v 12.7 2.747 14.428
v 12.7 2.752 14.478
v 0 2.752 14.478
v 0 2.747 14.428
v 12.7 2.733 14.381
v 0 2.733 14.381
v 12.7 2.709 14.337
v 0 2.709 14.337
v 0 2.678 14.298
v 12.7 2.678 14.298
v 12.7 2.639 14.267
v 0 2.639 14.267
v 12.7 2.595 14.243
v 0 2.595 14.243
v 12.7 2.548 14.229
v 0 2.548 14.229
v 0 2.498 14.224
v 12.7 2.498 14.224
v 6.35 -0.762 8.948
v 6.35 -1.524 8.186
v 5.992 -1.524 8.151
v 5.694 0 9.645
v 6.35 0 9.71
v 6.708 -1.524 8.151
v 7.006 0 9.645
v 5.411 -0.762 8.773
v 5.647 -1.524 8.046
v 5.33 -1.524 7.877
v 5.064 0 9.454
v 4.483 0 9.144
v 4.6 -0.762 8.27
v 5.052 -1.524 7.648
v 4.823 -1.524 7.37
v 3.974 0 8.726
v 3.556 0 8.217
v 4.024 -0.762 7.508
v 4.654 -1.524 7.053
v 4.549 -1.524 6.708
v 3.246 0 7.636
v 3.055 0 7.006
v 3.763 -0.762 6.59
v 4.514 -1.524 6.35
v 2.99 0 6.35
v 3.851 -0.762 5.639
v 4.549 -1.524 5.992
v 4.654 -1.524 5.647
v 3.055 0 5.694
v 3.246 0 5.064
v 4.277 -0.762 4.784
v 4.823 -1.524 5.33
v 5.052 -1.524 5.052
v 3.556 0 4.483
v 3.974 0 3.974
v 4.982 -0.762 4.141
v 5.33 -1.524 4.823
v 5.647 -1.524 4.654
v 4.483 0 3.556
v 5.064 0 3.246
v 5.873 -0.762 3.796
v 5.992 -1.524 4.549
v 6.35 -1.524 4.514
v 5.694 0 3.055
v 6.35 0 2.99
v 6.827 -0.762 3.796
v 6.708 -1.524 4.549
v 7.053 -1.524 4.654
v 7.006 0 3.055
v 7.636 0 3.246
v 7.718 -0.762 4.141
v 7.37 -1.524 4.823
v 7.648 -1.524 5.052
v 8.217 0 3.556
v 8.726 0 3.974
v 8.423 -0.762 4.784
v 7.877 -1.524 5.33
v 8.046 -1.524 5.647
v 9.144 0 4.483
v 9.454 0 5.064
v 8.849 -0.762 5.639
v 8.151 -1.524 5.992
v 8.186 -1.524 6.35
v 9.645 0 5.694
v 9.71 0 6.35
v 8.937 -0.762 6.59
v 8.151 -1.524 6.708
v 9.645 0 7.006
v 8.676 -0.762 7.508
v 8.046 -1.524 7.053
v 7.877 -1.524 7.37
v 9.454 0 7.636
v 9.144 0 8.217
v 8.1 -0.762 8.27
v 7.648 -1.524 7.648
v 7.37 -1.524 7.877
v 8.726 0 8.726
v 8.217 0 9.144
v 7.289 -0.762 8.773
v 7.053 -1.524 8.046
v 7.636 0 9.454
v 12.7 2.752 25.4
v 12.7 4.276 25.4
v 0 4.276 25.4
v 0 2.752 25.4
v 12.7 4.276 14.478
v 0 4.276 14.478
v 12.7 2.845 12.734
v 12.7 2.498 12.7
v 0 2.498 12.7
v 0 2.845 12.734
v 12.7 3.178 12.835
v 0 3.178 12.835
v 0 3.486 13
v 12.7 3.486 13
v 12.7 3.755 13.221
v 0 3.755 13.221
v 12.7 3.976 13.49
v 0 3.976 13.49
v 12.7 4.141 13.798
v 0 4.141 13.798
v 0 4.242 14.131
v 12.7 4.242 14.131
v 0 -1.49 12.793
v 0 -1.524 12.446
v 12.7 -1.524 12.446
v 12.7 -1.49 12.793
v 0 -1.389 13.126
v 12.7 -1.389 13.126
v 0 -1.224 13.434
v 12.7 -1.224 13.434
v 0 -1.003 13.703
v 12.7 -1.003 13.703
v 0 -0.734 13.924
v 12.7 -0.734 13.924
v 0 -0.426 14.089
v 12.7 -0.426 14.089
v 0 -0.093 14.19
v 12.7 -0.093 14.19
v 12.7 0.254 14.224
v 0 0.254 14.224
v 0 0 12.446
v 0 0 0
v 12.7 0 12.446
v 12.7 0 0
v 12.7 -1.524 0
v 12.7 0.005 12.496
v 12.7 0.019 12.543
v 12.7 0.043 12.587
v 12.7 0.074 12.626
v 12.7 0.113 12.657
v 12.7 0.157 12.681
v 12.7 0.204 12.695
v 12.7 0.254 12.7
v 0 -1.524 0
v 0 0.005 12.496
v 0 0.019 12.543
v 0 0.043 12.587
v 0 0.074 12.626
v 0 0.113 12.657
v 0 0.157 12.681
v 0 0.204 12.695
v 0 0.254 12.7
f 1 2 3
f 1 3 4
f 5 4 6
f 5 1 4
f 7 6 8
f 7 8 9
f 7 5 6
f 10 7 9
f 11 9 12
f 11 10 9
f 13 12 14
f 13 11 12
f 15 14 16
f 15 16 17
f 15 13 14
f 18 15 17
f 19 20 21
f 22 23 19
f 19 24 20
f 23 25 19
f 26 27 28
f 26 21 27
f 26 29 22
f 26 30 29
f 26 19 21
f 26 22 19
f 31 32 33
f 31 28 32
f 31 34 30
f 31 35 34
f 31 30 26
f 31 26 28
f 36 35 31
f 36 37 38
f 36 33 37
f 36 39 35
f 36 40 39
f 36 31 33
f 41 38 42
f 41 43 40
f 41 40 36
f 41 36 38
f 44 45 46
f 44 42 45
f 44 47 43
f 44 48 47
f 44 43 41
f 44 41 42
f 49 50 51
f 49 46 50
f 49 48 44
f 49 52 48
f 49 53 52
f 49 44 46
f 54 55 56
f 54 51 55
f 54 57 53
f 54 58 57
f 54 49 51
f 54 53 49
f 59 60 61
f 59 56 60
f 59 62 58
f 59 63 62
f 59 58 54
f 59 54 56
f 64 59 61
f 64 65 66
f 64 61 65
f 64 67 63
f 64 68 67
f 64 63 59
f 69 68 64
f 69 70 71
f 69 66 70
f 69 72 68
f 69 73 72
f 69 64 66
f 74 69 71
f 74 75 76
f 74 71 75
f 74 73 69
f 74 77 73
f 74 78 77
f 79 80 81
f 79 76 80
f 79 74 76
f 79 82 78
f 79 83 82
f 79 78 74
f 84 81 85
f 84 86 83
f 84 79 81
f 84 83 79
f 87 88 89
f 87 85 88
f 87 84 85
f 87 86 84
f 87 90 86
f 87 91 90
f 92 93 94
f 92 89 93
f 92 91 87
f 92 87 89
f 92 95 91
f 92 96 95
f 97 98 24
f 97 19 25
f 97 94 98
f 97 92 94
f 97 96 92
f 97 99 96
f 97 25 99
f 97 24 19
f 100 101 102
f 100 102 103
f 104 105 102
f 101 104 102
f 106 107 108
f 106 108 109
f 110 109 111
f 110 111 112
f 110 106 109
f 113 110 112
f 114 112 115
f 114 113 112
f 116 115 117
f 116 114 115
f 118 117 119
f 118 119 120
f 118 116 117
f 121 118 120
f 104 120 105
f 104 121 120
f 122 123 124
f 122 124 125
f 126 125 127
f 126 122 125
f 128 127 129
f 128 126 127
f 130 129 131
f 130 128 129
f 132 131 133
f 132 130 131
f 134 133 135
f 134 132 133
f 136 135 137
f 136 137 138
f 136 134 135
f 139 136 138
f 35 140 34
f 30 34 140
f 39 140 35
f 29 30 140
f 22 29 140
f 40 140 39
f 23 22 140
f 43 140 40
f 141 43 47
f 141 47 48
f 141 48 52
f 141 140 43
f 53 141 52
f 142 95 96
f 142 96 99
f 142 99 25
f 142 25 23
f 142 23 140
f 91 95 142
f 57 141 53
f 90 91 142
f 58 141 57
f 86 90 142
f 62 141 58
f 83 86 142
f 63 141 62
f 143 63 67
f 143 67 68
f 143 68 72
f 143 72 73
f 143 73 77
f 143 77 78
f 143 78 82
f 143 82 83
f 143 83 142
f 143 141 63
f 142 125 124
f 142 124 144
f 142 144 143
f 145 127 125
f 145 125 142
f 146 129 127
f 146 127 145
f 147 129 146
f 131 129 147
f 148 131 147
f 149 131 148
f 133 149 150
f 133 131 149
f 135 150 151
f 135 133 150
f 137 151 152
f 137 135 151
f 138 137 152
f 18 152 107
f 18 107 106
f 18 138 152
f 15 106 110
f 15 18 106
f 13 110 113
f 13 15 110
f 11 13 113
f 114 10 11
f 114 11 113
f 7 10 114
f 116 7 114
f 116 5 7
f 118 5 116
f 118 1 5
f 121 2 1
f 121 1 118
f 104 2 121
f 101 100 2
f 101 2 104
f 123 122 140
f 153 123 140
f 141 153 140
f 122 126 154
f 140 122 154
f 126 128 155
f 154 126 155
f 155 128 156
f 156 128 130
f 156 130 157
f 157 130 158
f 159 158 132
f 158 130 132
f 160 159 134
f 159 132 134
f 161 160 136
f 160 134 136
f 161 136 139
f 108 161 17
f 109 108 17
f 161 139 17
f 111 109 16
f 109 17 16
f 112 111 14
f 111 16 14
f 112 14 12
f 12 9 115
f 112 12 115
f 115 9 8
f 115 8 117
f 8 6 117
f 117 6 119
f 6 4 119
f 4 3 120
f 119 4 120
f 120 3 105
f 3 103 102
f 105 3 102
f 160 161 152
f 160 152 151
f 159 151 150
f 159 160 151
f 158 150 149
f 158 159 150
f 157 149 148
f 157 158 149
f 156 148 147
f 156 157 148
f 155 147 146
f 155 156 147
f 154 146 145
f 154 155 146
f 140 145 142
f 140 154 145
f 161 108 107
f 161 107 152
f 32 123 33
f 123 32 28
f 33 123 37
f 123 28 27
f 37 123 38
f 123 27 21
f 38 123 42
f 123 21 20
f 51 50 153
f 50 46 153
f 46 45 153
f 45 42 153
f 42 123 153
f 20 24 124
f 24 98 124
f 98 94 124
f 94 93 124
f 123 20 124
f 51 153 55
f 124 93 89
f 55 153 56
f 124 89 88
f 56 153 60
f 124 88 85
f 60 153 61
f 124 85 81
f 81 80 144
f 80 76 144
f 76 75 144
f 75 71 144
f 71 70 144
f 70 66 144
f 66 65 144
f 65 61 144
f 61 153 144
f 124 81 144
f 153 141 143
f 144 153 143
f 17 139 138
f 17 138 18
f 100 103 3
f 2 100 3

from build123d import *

# Parameters (mm, degrees)
SKETCH1_W                    = 12.7
SKETCH1_H                    = 1.524
BASE_FLANGE1_DEPTH           = 12.7
EDGE_FLANGE2_STRIP_W         = 6.604
EDGE_FLANGE2_STRIP_H         = 1.524
EDGE_FLANGE2_STRIP_CUT_DEPTH = 12.7
EDGE_FLANGE2_DEPTH           = 12.7
EDGE_FLANGE4_STRIP_W         = 6.604
EDGE_FLANGE4_STRIP_H         = 1.524
EDGE_FLANGE4_STRIP_CUT_DEPTH = 12.7
EDGE_FLANGE4_DEPTH           = 12.7


# Sheet-metal steps are written as plain solids
with BuildPart() as part:
    # Sketch1 → Base-Flange1 (new body)
    with BuildSketch(Plane.XY):
        with Locations((6.35, -0.762)):
            Rectangle(SKETCH1_W, SKETCH1_H)
    extrude(amount=BASE_FLANGE1_DEPTH)

    # Edge-Flange2 strip (across the edge) → Edge-Flange2 strip cut (cut)
    with BuildSketch(Plane(origin=(0, 0, 12.7), x_dir=(0, 0, -1), z_dir=(1, 0, 0))):
        with Locations((-3.048, -0.762)):
            Rectangle(EDGE_FLANGE2_STRIP_W, EDGE_FLANGE2_STRIP_H)
    extrude(amount=EDGE_FLANGE2_STRIP_CUT_DEPTH, mode=Mode.SUBTRACT)

    # Edge-Flange2 section (across the edge) → Edge-Flange2 (add)
    with BuildSketch(Plane(origin=(0, 0, 12.7), x_dir=(0, 0, -1), z_dir=(1, 0, 0))):
        with BuildLine():
            Line((-1.524, 0.254), (-1.524, 4.276))
            Line((-1.524, 4.276), (0, 4.276))
            Line((0, 4.276), (0, 0.254))
            ThreePointArc((0, 0.254), (0.074394878, 0.074394878), (0.254, 0))
            Line((0.254, 0), (0.254, -1.524))
            ThreePointArc((0.254, -1.524), (-1.003235857, -1.003235857), (-1.524, 0.254))
        make_face()
    extrude(amount=EDGE_FLANGE2_DEPTH)

    # Sketch10 → CSK for M3 SFHCS1 (revolve, cut)
    with BuildSketch(Plane(origin=(6.35, 0, 6.35), x_dir=(0, 0, 1), z_dir=(1, 0, 0))):
        Polygon((0, 0), (0, 1.524), (1.7, 1.524), (1.7, 1.66), (3.36, 0), align=None)
    revolve(axis=Axis((6.35, 6.35, 6.35), (0, -1, 0)), mode=Mode.SUBTRACT)

    # Edge-Flange4 strip (across the edge) → Edge-Flange4 strip cut (cut)
    with BuildSketch(Plane(origin=(12.7, 4.276, 14.224), x_dir=(0, -1, 0), z_dir=(-1, 0, 0))):
        with Locations((-1.524, -0.762)):
            Rectangle(EDGE_FLANGE4_STRIP_W, EDGE_FLANGE4_STRIP_H)
    extrude(amount=EDGE_FLANGE4_STRIP_CUT_DEPTH, mode=Mode.SUBTRACT)

    # Edge-Flange4 section (across the edge) → Edge-Flange4 (add)
    with BuildSketch(Plane(origin=(12.7, 4.276, 14.224), x_dir=(0, -1, 0), z_dir=(-1, 0, 0))):
        with BuildLine():
            Line((0, 0.254), (0, 11.176))
            Line((0, 11.176), (1.524, 11.176))
            Line((1.524, 11.176), (1.524, 0.254))
            ThreePointArc((1.524, 0.254), (1.598394878, 0.074394878), (1.778, 0))
            Line((1.778, 0), (1.778, -1.524))
            ThreePointArc((1.778, -1.524), (0.520764143, -1.003235857), (0, 0.254))
        make_face()
    extrude(amount=EDGE_FLANGE4_DEPTH)


solid = part.part
